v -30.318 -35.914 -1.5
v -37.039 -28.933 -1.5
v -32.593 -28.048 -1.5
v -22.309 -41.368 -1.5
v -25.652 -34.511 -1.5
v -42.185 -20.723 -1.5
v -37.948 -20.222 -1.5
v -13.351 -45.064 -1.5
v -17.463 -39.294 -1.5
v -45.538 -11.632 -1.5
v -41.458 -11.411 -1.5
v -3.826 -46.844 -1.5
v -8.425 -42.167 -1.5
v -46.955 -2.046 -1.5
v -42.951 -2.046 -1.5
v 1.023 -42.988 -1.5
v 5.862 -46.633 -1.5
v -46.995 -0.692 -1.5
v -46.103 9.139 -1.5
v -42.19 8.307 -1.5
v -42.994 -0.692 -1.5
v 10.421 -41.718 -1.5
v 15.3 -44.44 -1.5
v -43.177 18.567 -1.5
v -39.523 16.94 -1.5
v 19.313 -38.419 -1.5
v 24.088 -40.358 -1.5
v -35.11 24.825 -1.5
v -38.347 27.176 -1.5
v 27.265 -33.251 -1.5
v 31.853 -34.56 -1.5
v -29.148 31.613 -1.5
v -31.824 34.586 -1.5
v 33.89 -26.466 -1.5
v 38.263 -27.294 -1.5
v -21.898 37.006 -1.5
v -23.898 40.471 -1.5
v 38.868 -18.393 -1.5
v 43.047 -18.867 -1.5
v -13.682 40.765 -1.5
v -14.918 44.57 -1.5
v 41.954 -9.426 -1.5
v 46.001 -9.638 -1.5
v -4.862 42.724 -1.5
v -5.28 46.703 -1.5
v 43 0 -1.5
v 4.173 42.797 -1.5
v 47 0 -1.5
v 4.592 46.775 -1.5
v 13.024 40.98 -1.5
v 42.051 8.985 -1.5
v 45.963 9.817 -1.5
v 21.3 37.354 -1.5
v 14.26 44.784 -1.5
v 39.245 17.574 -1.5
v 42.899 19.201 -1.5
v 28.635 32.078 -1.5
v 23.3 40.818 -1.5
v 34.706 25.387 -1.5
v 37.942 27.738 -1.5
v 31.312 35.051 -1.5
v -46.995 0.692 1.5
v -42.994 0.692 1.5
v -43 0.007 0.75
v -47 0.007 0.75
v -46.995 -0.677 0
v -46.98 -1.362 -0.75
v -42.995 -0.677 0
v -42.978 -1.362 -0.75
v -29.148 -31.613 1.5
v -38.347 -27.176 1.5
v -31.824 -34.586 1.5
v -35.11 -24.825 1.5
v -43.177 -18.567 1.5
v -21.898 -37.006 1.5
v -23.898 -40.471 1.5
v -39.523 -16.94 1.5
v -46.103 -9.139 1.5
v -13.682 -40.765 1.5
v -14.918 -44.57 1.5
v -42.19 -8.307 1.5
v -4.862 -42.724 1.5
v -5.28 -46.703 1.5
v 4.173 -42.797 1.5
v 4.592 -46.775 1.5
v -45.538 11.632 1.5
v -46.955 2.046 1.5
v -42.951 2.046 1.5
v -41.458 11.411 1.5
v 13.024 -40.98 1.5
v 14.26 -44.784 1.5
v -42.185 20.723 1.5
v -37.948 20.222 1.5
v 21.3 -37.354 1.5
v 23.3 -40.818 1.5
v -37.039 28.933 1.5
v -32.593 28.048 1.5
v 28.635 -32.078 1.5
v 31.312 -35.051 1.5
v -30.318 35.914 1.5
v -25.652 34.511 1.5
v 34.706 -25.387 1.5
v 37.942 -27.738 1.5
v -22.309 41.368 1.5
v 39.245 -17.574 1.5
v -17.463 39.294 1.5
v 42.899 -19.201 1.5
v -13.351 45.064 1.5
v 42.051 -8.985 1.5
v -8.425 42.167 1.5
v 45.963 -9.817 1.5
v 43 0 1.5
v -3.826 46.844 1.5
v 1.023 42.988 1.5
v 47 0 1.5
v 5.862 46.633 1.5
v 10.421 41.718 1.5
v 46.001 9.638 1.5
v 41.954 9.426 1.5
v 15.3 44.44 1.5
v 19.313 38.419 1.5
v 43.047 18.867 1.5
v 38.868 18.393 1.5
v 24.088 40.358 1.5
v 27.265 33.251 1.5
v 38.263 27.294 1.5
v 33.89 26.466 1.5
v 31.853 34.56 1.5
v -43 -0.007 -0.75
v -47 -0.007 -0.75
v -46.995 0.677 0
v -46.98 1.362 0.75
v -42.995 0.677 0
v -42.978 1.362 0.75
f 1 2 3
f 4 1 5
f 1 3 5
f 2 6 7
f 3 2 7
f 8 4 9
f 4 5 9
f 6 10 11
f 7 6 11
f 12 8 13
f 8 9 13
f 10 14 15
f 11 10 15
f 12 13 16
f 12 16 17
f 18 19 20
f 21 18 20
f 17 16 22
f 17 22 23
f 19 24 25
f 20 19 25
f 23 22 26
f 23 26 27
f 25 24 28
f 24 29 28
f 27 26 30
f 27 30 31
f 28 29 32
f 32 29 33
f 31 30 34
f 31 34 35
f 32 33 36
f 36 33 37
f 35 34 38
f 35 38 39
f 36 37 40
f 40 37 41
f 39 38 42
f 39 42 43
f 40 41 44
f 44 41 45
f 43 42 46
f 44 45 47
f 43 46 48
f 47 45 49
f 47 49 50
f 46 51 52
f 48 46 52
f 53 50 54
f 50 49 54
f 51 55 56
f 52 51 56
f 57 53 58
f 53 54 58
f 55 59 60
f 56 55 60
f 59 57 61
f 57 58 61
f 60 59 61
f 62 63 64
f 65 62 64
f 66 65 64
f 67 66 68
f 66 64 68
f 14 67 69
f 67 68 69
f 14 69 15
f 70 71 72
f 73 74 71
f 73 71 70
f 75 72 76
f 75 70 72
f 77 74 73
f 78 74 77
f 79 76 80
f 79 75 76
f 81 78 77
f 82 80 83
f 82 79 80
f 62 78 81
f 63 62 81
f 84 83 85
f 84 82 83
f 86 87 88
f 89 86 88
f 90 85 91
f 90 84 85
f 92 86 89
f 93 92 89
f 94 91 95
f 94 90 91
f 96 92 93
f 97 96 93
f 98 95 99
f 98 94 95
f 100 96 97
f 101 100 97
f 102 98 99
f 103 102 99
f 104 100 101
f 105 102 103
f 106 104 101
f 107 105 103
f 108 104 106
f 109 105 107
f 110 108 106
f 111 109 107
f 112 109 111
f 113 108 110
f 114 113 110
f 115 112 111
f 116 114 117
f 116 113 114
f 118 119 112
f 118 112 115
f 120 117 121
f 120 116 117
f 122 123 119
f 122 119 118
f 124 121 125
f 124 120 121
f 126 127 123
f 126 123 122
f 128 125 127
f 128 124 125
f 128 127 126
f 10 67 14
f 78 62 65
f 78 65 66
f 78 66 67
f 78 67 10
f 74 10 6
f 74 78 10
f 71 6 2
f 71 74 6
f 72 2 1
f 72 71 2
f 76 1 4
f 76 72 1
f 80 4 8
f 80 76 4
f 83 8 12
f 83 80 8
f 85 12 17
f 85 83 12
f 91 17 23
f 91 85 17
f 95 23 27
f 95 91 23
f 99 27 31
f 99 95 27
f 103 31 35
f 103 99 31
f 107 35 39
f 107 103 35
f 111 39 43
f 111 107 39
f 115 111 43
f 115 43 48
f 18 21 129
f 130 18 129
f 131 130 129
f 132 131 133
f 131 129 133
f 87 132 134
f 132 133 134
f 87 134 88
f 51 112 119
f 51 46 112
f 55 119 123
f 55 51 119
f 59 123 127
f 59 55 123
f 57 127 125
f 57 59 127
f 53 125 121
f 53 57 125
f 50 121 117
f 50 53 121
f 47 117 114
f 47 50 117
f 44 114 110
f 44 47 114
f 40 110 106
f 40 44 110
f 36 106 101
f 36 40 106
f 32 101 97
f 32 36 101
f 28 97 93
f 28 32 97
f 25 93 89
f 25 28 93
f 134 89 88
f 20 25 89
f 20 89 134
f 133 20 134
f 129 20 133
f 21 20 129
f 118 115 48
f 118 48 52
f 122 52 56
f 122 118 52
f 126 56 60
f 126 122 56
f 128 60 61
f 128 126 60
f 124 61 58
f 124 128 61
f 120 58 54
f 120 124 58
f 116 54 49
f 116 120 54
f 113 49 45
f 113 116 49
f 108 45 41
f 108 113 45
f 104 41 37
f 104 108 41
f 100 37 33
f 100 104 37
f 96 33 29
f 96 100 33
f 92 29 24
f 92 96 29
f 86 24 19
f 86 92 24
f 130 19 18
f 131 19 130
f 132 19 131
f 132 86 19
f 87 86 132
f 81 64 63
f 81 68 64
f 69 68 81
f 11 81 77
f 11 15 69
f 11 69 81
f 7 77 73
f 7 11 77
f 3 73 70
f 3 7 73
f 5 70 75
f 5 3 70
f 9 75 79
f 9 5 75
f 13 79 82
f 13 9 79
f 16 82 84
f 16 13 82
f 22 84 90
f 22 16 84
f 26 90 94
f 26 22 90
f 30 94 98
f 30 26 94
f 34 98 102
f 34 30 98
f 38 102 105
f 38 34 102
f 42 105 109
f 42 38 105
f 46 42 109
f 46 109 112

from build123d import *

# Parameters (mm, degrees)
SKETCH1_R           = 47
SKETCH1_R_2         = 43
BOSS_EXTRUDE1_DEPTH = 1.5
CUT_EXTRUDE1_DEPTH  = 67.484960705


with BuildPart() as part:
    # Sketch1 → Boss-Extrude1 (new, symmetric)
    with BuildSketch(Plane.XY):
        Circle(SKETCH1_R)
        Circle(SKETCH1_R_2, mode=Mode.SUBTRACT)
    extrude(amount=BOSS_EXTRUDE1_DEPTH, both=True)

    # Sketch2 → Cut-Extrude1 (cut, through all)
    with BuildSketch(Plane(origin=(0, 0, 0), x_dir=(0, 0, -1), z_dir=(1, 0, 0))):
        Polygon((-7.723456939, 6.371672693), (7.049357633, -7.110313422), (7.723456939, -6.371672693), (-7.049357633, 7.110313422), align=None)
    extrude(amount=-CUT_EXTRUDE1_DEPTH, mode=Mode.SUBTRACT)


solid = part.part
